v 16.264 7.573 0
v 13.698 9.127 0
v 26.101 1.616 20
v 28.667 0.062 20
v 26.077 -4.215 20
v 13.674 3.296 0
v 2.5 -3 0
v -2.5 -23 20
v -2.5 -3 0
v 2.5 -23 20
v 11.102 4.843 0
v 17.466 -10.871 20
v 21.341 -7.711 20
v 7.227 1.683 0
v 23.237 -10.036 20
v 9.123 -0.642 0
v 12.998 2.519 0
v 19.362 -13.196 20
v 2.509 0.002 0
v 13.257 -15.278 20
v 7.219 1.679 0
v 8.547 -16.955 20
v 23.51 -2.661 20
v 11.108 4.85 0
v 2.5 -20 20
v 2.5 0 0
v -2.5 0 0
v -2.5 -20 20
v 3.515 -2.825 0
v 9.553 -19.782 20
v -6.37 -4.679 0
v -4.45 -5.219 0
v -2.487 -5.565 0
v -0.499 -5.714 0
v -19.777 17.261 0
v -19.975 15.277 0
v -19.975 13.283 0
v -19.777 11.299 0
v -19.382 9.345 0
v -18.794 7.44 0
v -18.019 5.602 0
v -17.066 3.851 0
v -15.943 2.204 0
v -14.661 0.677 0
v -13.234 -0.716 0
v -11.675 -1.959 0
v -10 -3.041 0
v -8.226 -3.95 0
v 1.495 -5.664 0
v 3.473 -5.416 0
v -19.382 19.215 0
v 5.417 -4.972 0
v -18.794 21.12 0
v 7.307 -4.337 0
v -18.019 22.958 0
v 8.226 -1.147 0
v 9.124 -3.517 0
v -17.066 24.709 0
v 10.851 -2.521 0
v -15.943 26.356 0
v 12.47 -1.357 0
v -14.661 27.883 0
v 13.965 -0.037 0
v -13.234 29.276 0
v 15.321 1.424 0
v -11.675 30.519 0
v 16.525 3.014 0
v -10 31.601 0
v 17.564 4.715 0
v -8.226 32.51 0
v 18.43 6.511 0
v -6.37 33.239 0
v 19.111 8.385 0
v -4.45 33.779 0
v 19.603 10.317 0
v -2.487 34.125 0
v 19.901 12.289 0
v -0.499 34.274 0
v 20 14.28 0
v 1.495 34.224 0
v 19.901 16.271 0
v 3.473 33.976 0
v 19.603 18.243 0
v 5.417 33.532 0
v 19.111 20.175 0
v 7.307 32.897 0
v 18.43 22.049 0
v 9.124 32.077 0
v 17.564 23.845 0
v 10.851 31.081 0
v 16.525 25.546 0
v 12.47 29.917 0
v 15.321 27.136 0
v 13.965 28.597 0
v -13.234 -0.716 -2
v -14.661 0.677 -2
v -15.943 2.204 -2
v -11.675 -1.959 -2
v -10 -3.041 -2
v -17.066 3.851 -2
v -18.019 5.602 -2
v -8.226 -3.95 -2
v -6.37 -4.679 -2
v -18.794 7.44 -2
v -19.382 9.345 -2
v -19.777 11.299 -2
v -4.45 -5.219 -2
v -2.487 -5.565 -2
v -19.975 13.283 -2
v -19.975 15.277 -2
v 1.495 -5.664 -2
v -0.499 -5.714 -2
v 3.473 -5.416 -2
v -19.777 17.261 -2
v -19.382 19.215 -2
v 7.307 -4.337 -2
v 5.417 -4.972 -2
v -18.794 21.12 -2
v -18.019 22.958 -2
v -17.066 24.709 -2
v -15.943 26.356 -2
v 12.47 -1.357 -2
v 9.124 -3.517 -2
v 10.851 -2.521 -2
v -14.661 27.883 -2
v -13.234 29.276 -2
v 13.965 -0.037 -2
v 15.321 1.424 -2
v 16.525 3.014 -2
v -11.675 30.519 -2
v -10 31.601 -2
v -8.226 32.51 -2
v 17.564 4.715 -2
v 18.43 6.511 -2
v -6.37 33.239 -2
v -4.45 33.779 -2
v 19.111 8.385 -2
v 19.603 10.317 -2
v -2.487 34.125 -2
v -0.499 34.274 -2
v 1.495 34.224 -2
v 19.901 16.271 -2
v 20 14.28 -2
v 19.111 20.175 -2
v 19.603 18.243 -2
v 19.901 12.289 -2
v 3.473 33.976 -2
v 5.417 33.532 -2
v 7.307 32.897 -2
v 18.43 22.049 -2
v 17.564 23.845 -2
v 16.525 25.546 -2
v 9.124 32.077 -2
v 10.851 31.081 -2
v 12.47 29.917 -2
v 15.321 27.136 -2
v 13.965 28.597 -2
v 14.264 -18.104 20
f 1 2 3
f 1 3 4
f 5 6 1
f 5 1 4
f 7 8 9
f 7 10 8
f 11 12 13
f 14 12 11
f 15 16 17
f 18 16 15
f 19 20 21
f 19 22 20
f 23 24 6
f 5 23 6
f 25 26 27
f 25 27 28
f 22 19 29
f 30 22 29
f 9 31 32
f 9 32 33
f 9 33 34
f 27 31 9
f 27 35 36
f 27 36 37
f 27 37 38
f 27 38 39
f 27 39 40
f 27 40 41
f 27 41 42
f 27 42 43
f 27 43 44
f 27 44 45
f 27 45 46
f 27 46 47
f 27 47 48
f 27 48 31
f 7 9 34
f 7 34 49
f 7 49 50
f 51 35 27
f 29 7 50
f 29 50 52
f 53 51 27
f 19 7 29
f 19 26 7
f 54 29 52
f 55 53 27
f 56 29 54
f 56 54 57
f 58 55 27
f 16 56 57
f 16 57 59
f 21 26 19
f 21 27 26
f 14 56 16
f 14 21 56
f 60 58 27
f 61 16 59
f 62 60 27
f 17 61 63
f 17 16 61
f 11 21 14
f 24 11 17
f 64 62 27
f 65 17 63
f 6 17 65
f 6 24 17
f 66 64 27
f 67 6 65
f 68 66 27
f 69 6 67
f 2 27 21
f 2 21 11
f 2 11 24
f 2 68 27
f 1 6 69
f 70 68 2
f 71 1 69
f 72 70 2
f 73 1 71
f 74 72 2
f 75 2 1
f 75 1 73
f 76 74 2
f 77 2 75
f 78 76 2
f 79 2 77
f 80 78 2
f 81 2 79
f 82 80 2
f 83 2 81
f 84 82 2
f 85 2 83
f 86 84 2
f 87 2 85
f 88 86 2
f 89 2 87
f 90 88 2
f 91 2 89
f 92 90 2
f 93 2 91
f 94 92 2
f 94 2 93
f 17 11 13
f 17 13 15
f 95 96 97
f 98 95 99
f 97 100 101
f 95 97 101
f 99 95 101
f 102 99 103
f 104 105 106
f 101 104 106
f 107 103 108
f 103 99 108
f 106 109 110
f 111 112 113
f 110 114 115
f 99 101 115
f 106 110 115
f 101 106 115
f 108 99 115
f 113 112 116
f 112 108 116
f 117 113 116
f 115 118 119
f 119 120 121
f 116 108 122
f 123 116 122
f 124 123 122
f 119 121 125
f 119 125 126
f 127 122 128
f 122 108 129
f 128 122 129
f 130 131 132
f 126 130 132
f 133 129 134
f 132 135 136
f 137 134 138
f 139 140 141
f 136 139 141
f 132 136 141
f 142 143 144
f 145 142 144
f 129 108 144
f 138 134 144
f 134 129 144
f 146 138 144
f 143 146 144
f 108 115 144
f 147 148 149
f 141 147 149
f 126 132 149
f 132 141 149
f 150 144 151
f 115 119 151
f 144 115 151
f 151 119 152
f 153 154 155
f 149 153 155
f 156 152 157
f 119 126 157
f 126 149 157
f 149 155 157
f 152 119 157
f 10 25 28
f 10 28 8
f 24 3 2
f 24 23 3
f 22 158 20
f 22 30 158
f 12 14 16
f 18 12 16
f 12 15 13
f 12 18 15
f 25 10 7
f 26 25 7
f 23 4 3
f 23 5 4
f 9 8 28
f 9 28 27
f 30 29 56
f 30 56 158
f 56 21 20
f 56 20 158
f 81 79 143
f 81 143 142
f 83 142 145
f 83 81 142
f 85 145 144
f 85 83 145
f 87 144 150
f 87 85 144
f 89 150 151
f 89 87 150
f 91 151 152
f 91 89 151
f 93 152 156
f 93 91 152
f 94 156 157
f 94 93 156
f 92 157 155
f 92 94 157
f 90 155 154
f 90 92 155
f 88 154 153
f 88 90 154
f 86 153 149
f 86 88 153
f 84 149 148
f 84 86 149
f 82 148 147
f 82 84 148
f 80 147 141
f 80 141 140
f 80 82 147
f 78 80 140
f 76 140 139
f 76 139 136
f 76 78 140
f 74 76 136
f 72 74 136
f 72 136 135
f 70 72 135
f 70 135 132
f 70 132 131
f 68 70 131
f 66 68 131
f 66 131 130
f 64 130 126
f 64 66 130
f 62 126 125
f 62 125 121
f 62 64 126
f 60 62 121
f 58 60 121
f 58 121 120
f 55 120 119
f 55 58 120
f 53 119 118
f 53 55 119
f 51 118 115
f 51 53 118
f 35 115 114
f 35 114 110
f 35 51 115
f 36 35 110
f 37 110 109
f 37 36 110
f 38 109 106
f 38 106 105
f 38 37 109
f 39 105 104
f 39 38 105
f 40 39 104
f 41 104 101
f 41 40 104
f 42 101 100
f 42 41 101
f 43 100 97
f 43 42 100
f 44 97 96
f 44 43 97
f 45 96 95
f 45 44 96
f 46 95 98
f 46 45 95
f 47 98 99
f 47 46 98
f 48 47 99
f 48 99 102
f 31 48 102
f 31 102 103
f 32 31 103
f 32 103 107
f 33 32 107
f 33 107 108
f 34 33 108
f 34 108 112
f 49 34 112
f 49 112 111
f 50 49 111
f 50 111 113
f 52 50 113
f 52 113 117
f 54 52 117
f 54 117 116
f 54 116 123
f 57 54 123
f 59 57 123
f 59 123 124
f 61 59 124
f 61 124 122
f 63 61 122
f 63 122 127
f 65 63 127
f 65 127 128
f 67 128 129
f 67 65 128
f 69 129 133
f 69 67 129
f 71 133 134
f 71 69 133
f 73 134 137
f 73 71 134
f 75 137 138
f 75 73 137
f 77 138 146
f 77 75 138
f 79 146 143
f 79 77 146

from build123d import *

# Parameters (mm, degrees)
F3_DEPTH  = 2.5
F4_R      = 20
F5_DEPTH  = 2
F6_DEPTH  = 2.5
F9_DEPTH  = 2.5
F12_DEPTH = 2.5


with BuildPart() as f3:
    # F0 (on Right) → F3 (new body, symmetric)
    with BuildSketch(Plane.YZ):
        Polygon((-3, 0), (0, 0), (-20, 20), (-23, 20), align=None)
    extrude(amount=F3_DEPTH, both=True)

    # F4 (on Top) → F5 (join)
    with BuildSketch(Plane.XY):
        with Locations((0, 14.28)):
            Circle(F4_R)
    extrude(amount=-F5_DEPTH)

    # F2 (on line) → F6 (join, symmetric)
    with BuildSketch(Plane(origin=(4.5822124443, 1.6316524569, 0), x_dir=(0.3354515698, -0.9420574528, 0), z_dir=(-0.9420574528, -0.3354515698, 0))):
        Polygon((18.8401669346, 20), (0.8401669346, 0), (3.8401669346, 0), (21.8401669346, 20), align=None)
    extrude(amount=F6_DEPTH, both=True)

    # F8 (on line) → F9 (join, symmetric)
    with BuildSketch(Plane(origin=(7.1019205596, 5.7921850717, 0), x_dir=(0.6320293027, -0.7749444887, 0), z_dir=(-0.7749444887, -0.6320293027, 0))):
        Polygon((19.4633049138, 20), (3.2633049138, 0), (6.2633049138, 0), (22.4633049138, 20), align=None)
    extrude(amount=F9_DEPTH, both=True)

    # F11 (on line) → F12 (join, symmetric)
    with BuildSketch(Plane(origin=(6.4249759494, 10.6088962546, 0), x_dir=(0.8553642602, -0.5180270094, 0), z_dir=(-0.5180270094, -0.8553642602, 0))):
        Polygon((21.4886083641, 20), (6.9886083641, 0), (9.9886083641, 0), (24.4886083641, 20), align=None)
    extrude(amount=F12_DEPTH, both=True)


solid = f3.part
